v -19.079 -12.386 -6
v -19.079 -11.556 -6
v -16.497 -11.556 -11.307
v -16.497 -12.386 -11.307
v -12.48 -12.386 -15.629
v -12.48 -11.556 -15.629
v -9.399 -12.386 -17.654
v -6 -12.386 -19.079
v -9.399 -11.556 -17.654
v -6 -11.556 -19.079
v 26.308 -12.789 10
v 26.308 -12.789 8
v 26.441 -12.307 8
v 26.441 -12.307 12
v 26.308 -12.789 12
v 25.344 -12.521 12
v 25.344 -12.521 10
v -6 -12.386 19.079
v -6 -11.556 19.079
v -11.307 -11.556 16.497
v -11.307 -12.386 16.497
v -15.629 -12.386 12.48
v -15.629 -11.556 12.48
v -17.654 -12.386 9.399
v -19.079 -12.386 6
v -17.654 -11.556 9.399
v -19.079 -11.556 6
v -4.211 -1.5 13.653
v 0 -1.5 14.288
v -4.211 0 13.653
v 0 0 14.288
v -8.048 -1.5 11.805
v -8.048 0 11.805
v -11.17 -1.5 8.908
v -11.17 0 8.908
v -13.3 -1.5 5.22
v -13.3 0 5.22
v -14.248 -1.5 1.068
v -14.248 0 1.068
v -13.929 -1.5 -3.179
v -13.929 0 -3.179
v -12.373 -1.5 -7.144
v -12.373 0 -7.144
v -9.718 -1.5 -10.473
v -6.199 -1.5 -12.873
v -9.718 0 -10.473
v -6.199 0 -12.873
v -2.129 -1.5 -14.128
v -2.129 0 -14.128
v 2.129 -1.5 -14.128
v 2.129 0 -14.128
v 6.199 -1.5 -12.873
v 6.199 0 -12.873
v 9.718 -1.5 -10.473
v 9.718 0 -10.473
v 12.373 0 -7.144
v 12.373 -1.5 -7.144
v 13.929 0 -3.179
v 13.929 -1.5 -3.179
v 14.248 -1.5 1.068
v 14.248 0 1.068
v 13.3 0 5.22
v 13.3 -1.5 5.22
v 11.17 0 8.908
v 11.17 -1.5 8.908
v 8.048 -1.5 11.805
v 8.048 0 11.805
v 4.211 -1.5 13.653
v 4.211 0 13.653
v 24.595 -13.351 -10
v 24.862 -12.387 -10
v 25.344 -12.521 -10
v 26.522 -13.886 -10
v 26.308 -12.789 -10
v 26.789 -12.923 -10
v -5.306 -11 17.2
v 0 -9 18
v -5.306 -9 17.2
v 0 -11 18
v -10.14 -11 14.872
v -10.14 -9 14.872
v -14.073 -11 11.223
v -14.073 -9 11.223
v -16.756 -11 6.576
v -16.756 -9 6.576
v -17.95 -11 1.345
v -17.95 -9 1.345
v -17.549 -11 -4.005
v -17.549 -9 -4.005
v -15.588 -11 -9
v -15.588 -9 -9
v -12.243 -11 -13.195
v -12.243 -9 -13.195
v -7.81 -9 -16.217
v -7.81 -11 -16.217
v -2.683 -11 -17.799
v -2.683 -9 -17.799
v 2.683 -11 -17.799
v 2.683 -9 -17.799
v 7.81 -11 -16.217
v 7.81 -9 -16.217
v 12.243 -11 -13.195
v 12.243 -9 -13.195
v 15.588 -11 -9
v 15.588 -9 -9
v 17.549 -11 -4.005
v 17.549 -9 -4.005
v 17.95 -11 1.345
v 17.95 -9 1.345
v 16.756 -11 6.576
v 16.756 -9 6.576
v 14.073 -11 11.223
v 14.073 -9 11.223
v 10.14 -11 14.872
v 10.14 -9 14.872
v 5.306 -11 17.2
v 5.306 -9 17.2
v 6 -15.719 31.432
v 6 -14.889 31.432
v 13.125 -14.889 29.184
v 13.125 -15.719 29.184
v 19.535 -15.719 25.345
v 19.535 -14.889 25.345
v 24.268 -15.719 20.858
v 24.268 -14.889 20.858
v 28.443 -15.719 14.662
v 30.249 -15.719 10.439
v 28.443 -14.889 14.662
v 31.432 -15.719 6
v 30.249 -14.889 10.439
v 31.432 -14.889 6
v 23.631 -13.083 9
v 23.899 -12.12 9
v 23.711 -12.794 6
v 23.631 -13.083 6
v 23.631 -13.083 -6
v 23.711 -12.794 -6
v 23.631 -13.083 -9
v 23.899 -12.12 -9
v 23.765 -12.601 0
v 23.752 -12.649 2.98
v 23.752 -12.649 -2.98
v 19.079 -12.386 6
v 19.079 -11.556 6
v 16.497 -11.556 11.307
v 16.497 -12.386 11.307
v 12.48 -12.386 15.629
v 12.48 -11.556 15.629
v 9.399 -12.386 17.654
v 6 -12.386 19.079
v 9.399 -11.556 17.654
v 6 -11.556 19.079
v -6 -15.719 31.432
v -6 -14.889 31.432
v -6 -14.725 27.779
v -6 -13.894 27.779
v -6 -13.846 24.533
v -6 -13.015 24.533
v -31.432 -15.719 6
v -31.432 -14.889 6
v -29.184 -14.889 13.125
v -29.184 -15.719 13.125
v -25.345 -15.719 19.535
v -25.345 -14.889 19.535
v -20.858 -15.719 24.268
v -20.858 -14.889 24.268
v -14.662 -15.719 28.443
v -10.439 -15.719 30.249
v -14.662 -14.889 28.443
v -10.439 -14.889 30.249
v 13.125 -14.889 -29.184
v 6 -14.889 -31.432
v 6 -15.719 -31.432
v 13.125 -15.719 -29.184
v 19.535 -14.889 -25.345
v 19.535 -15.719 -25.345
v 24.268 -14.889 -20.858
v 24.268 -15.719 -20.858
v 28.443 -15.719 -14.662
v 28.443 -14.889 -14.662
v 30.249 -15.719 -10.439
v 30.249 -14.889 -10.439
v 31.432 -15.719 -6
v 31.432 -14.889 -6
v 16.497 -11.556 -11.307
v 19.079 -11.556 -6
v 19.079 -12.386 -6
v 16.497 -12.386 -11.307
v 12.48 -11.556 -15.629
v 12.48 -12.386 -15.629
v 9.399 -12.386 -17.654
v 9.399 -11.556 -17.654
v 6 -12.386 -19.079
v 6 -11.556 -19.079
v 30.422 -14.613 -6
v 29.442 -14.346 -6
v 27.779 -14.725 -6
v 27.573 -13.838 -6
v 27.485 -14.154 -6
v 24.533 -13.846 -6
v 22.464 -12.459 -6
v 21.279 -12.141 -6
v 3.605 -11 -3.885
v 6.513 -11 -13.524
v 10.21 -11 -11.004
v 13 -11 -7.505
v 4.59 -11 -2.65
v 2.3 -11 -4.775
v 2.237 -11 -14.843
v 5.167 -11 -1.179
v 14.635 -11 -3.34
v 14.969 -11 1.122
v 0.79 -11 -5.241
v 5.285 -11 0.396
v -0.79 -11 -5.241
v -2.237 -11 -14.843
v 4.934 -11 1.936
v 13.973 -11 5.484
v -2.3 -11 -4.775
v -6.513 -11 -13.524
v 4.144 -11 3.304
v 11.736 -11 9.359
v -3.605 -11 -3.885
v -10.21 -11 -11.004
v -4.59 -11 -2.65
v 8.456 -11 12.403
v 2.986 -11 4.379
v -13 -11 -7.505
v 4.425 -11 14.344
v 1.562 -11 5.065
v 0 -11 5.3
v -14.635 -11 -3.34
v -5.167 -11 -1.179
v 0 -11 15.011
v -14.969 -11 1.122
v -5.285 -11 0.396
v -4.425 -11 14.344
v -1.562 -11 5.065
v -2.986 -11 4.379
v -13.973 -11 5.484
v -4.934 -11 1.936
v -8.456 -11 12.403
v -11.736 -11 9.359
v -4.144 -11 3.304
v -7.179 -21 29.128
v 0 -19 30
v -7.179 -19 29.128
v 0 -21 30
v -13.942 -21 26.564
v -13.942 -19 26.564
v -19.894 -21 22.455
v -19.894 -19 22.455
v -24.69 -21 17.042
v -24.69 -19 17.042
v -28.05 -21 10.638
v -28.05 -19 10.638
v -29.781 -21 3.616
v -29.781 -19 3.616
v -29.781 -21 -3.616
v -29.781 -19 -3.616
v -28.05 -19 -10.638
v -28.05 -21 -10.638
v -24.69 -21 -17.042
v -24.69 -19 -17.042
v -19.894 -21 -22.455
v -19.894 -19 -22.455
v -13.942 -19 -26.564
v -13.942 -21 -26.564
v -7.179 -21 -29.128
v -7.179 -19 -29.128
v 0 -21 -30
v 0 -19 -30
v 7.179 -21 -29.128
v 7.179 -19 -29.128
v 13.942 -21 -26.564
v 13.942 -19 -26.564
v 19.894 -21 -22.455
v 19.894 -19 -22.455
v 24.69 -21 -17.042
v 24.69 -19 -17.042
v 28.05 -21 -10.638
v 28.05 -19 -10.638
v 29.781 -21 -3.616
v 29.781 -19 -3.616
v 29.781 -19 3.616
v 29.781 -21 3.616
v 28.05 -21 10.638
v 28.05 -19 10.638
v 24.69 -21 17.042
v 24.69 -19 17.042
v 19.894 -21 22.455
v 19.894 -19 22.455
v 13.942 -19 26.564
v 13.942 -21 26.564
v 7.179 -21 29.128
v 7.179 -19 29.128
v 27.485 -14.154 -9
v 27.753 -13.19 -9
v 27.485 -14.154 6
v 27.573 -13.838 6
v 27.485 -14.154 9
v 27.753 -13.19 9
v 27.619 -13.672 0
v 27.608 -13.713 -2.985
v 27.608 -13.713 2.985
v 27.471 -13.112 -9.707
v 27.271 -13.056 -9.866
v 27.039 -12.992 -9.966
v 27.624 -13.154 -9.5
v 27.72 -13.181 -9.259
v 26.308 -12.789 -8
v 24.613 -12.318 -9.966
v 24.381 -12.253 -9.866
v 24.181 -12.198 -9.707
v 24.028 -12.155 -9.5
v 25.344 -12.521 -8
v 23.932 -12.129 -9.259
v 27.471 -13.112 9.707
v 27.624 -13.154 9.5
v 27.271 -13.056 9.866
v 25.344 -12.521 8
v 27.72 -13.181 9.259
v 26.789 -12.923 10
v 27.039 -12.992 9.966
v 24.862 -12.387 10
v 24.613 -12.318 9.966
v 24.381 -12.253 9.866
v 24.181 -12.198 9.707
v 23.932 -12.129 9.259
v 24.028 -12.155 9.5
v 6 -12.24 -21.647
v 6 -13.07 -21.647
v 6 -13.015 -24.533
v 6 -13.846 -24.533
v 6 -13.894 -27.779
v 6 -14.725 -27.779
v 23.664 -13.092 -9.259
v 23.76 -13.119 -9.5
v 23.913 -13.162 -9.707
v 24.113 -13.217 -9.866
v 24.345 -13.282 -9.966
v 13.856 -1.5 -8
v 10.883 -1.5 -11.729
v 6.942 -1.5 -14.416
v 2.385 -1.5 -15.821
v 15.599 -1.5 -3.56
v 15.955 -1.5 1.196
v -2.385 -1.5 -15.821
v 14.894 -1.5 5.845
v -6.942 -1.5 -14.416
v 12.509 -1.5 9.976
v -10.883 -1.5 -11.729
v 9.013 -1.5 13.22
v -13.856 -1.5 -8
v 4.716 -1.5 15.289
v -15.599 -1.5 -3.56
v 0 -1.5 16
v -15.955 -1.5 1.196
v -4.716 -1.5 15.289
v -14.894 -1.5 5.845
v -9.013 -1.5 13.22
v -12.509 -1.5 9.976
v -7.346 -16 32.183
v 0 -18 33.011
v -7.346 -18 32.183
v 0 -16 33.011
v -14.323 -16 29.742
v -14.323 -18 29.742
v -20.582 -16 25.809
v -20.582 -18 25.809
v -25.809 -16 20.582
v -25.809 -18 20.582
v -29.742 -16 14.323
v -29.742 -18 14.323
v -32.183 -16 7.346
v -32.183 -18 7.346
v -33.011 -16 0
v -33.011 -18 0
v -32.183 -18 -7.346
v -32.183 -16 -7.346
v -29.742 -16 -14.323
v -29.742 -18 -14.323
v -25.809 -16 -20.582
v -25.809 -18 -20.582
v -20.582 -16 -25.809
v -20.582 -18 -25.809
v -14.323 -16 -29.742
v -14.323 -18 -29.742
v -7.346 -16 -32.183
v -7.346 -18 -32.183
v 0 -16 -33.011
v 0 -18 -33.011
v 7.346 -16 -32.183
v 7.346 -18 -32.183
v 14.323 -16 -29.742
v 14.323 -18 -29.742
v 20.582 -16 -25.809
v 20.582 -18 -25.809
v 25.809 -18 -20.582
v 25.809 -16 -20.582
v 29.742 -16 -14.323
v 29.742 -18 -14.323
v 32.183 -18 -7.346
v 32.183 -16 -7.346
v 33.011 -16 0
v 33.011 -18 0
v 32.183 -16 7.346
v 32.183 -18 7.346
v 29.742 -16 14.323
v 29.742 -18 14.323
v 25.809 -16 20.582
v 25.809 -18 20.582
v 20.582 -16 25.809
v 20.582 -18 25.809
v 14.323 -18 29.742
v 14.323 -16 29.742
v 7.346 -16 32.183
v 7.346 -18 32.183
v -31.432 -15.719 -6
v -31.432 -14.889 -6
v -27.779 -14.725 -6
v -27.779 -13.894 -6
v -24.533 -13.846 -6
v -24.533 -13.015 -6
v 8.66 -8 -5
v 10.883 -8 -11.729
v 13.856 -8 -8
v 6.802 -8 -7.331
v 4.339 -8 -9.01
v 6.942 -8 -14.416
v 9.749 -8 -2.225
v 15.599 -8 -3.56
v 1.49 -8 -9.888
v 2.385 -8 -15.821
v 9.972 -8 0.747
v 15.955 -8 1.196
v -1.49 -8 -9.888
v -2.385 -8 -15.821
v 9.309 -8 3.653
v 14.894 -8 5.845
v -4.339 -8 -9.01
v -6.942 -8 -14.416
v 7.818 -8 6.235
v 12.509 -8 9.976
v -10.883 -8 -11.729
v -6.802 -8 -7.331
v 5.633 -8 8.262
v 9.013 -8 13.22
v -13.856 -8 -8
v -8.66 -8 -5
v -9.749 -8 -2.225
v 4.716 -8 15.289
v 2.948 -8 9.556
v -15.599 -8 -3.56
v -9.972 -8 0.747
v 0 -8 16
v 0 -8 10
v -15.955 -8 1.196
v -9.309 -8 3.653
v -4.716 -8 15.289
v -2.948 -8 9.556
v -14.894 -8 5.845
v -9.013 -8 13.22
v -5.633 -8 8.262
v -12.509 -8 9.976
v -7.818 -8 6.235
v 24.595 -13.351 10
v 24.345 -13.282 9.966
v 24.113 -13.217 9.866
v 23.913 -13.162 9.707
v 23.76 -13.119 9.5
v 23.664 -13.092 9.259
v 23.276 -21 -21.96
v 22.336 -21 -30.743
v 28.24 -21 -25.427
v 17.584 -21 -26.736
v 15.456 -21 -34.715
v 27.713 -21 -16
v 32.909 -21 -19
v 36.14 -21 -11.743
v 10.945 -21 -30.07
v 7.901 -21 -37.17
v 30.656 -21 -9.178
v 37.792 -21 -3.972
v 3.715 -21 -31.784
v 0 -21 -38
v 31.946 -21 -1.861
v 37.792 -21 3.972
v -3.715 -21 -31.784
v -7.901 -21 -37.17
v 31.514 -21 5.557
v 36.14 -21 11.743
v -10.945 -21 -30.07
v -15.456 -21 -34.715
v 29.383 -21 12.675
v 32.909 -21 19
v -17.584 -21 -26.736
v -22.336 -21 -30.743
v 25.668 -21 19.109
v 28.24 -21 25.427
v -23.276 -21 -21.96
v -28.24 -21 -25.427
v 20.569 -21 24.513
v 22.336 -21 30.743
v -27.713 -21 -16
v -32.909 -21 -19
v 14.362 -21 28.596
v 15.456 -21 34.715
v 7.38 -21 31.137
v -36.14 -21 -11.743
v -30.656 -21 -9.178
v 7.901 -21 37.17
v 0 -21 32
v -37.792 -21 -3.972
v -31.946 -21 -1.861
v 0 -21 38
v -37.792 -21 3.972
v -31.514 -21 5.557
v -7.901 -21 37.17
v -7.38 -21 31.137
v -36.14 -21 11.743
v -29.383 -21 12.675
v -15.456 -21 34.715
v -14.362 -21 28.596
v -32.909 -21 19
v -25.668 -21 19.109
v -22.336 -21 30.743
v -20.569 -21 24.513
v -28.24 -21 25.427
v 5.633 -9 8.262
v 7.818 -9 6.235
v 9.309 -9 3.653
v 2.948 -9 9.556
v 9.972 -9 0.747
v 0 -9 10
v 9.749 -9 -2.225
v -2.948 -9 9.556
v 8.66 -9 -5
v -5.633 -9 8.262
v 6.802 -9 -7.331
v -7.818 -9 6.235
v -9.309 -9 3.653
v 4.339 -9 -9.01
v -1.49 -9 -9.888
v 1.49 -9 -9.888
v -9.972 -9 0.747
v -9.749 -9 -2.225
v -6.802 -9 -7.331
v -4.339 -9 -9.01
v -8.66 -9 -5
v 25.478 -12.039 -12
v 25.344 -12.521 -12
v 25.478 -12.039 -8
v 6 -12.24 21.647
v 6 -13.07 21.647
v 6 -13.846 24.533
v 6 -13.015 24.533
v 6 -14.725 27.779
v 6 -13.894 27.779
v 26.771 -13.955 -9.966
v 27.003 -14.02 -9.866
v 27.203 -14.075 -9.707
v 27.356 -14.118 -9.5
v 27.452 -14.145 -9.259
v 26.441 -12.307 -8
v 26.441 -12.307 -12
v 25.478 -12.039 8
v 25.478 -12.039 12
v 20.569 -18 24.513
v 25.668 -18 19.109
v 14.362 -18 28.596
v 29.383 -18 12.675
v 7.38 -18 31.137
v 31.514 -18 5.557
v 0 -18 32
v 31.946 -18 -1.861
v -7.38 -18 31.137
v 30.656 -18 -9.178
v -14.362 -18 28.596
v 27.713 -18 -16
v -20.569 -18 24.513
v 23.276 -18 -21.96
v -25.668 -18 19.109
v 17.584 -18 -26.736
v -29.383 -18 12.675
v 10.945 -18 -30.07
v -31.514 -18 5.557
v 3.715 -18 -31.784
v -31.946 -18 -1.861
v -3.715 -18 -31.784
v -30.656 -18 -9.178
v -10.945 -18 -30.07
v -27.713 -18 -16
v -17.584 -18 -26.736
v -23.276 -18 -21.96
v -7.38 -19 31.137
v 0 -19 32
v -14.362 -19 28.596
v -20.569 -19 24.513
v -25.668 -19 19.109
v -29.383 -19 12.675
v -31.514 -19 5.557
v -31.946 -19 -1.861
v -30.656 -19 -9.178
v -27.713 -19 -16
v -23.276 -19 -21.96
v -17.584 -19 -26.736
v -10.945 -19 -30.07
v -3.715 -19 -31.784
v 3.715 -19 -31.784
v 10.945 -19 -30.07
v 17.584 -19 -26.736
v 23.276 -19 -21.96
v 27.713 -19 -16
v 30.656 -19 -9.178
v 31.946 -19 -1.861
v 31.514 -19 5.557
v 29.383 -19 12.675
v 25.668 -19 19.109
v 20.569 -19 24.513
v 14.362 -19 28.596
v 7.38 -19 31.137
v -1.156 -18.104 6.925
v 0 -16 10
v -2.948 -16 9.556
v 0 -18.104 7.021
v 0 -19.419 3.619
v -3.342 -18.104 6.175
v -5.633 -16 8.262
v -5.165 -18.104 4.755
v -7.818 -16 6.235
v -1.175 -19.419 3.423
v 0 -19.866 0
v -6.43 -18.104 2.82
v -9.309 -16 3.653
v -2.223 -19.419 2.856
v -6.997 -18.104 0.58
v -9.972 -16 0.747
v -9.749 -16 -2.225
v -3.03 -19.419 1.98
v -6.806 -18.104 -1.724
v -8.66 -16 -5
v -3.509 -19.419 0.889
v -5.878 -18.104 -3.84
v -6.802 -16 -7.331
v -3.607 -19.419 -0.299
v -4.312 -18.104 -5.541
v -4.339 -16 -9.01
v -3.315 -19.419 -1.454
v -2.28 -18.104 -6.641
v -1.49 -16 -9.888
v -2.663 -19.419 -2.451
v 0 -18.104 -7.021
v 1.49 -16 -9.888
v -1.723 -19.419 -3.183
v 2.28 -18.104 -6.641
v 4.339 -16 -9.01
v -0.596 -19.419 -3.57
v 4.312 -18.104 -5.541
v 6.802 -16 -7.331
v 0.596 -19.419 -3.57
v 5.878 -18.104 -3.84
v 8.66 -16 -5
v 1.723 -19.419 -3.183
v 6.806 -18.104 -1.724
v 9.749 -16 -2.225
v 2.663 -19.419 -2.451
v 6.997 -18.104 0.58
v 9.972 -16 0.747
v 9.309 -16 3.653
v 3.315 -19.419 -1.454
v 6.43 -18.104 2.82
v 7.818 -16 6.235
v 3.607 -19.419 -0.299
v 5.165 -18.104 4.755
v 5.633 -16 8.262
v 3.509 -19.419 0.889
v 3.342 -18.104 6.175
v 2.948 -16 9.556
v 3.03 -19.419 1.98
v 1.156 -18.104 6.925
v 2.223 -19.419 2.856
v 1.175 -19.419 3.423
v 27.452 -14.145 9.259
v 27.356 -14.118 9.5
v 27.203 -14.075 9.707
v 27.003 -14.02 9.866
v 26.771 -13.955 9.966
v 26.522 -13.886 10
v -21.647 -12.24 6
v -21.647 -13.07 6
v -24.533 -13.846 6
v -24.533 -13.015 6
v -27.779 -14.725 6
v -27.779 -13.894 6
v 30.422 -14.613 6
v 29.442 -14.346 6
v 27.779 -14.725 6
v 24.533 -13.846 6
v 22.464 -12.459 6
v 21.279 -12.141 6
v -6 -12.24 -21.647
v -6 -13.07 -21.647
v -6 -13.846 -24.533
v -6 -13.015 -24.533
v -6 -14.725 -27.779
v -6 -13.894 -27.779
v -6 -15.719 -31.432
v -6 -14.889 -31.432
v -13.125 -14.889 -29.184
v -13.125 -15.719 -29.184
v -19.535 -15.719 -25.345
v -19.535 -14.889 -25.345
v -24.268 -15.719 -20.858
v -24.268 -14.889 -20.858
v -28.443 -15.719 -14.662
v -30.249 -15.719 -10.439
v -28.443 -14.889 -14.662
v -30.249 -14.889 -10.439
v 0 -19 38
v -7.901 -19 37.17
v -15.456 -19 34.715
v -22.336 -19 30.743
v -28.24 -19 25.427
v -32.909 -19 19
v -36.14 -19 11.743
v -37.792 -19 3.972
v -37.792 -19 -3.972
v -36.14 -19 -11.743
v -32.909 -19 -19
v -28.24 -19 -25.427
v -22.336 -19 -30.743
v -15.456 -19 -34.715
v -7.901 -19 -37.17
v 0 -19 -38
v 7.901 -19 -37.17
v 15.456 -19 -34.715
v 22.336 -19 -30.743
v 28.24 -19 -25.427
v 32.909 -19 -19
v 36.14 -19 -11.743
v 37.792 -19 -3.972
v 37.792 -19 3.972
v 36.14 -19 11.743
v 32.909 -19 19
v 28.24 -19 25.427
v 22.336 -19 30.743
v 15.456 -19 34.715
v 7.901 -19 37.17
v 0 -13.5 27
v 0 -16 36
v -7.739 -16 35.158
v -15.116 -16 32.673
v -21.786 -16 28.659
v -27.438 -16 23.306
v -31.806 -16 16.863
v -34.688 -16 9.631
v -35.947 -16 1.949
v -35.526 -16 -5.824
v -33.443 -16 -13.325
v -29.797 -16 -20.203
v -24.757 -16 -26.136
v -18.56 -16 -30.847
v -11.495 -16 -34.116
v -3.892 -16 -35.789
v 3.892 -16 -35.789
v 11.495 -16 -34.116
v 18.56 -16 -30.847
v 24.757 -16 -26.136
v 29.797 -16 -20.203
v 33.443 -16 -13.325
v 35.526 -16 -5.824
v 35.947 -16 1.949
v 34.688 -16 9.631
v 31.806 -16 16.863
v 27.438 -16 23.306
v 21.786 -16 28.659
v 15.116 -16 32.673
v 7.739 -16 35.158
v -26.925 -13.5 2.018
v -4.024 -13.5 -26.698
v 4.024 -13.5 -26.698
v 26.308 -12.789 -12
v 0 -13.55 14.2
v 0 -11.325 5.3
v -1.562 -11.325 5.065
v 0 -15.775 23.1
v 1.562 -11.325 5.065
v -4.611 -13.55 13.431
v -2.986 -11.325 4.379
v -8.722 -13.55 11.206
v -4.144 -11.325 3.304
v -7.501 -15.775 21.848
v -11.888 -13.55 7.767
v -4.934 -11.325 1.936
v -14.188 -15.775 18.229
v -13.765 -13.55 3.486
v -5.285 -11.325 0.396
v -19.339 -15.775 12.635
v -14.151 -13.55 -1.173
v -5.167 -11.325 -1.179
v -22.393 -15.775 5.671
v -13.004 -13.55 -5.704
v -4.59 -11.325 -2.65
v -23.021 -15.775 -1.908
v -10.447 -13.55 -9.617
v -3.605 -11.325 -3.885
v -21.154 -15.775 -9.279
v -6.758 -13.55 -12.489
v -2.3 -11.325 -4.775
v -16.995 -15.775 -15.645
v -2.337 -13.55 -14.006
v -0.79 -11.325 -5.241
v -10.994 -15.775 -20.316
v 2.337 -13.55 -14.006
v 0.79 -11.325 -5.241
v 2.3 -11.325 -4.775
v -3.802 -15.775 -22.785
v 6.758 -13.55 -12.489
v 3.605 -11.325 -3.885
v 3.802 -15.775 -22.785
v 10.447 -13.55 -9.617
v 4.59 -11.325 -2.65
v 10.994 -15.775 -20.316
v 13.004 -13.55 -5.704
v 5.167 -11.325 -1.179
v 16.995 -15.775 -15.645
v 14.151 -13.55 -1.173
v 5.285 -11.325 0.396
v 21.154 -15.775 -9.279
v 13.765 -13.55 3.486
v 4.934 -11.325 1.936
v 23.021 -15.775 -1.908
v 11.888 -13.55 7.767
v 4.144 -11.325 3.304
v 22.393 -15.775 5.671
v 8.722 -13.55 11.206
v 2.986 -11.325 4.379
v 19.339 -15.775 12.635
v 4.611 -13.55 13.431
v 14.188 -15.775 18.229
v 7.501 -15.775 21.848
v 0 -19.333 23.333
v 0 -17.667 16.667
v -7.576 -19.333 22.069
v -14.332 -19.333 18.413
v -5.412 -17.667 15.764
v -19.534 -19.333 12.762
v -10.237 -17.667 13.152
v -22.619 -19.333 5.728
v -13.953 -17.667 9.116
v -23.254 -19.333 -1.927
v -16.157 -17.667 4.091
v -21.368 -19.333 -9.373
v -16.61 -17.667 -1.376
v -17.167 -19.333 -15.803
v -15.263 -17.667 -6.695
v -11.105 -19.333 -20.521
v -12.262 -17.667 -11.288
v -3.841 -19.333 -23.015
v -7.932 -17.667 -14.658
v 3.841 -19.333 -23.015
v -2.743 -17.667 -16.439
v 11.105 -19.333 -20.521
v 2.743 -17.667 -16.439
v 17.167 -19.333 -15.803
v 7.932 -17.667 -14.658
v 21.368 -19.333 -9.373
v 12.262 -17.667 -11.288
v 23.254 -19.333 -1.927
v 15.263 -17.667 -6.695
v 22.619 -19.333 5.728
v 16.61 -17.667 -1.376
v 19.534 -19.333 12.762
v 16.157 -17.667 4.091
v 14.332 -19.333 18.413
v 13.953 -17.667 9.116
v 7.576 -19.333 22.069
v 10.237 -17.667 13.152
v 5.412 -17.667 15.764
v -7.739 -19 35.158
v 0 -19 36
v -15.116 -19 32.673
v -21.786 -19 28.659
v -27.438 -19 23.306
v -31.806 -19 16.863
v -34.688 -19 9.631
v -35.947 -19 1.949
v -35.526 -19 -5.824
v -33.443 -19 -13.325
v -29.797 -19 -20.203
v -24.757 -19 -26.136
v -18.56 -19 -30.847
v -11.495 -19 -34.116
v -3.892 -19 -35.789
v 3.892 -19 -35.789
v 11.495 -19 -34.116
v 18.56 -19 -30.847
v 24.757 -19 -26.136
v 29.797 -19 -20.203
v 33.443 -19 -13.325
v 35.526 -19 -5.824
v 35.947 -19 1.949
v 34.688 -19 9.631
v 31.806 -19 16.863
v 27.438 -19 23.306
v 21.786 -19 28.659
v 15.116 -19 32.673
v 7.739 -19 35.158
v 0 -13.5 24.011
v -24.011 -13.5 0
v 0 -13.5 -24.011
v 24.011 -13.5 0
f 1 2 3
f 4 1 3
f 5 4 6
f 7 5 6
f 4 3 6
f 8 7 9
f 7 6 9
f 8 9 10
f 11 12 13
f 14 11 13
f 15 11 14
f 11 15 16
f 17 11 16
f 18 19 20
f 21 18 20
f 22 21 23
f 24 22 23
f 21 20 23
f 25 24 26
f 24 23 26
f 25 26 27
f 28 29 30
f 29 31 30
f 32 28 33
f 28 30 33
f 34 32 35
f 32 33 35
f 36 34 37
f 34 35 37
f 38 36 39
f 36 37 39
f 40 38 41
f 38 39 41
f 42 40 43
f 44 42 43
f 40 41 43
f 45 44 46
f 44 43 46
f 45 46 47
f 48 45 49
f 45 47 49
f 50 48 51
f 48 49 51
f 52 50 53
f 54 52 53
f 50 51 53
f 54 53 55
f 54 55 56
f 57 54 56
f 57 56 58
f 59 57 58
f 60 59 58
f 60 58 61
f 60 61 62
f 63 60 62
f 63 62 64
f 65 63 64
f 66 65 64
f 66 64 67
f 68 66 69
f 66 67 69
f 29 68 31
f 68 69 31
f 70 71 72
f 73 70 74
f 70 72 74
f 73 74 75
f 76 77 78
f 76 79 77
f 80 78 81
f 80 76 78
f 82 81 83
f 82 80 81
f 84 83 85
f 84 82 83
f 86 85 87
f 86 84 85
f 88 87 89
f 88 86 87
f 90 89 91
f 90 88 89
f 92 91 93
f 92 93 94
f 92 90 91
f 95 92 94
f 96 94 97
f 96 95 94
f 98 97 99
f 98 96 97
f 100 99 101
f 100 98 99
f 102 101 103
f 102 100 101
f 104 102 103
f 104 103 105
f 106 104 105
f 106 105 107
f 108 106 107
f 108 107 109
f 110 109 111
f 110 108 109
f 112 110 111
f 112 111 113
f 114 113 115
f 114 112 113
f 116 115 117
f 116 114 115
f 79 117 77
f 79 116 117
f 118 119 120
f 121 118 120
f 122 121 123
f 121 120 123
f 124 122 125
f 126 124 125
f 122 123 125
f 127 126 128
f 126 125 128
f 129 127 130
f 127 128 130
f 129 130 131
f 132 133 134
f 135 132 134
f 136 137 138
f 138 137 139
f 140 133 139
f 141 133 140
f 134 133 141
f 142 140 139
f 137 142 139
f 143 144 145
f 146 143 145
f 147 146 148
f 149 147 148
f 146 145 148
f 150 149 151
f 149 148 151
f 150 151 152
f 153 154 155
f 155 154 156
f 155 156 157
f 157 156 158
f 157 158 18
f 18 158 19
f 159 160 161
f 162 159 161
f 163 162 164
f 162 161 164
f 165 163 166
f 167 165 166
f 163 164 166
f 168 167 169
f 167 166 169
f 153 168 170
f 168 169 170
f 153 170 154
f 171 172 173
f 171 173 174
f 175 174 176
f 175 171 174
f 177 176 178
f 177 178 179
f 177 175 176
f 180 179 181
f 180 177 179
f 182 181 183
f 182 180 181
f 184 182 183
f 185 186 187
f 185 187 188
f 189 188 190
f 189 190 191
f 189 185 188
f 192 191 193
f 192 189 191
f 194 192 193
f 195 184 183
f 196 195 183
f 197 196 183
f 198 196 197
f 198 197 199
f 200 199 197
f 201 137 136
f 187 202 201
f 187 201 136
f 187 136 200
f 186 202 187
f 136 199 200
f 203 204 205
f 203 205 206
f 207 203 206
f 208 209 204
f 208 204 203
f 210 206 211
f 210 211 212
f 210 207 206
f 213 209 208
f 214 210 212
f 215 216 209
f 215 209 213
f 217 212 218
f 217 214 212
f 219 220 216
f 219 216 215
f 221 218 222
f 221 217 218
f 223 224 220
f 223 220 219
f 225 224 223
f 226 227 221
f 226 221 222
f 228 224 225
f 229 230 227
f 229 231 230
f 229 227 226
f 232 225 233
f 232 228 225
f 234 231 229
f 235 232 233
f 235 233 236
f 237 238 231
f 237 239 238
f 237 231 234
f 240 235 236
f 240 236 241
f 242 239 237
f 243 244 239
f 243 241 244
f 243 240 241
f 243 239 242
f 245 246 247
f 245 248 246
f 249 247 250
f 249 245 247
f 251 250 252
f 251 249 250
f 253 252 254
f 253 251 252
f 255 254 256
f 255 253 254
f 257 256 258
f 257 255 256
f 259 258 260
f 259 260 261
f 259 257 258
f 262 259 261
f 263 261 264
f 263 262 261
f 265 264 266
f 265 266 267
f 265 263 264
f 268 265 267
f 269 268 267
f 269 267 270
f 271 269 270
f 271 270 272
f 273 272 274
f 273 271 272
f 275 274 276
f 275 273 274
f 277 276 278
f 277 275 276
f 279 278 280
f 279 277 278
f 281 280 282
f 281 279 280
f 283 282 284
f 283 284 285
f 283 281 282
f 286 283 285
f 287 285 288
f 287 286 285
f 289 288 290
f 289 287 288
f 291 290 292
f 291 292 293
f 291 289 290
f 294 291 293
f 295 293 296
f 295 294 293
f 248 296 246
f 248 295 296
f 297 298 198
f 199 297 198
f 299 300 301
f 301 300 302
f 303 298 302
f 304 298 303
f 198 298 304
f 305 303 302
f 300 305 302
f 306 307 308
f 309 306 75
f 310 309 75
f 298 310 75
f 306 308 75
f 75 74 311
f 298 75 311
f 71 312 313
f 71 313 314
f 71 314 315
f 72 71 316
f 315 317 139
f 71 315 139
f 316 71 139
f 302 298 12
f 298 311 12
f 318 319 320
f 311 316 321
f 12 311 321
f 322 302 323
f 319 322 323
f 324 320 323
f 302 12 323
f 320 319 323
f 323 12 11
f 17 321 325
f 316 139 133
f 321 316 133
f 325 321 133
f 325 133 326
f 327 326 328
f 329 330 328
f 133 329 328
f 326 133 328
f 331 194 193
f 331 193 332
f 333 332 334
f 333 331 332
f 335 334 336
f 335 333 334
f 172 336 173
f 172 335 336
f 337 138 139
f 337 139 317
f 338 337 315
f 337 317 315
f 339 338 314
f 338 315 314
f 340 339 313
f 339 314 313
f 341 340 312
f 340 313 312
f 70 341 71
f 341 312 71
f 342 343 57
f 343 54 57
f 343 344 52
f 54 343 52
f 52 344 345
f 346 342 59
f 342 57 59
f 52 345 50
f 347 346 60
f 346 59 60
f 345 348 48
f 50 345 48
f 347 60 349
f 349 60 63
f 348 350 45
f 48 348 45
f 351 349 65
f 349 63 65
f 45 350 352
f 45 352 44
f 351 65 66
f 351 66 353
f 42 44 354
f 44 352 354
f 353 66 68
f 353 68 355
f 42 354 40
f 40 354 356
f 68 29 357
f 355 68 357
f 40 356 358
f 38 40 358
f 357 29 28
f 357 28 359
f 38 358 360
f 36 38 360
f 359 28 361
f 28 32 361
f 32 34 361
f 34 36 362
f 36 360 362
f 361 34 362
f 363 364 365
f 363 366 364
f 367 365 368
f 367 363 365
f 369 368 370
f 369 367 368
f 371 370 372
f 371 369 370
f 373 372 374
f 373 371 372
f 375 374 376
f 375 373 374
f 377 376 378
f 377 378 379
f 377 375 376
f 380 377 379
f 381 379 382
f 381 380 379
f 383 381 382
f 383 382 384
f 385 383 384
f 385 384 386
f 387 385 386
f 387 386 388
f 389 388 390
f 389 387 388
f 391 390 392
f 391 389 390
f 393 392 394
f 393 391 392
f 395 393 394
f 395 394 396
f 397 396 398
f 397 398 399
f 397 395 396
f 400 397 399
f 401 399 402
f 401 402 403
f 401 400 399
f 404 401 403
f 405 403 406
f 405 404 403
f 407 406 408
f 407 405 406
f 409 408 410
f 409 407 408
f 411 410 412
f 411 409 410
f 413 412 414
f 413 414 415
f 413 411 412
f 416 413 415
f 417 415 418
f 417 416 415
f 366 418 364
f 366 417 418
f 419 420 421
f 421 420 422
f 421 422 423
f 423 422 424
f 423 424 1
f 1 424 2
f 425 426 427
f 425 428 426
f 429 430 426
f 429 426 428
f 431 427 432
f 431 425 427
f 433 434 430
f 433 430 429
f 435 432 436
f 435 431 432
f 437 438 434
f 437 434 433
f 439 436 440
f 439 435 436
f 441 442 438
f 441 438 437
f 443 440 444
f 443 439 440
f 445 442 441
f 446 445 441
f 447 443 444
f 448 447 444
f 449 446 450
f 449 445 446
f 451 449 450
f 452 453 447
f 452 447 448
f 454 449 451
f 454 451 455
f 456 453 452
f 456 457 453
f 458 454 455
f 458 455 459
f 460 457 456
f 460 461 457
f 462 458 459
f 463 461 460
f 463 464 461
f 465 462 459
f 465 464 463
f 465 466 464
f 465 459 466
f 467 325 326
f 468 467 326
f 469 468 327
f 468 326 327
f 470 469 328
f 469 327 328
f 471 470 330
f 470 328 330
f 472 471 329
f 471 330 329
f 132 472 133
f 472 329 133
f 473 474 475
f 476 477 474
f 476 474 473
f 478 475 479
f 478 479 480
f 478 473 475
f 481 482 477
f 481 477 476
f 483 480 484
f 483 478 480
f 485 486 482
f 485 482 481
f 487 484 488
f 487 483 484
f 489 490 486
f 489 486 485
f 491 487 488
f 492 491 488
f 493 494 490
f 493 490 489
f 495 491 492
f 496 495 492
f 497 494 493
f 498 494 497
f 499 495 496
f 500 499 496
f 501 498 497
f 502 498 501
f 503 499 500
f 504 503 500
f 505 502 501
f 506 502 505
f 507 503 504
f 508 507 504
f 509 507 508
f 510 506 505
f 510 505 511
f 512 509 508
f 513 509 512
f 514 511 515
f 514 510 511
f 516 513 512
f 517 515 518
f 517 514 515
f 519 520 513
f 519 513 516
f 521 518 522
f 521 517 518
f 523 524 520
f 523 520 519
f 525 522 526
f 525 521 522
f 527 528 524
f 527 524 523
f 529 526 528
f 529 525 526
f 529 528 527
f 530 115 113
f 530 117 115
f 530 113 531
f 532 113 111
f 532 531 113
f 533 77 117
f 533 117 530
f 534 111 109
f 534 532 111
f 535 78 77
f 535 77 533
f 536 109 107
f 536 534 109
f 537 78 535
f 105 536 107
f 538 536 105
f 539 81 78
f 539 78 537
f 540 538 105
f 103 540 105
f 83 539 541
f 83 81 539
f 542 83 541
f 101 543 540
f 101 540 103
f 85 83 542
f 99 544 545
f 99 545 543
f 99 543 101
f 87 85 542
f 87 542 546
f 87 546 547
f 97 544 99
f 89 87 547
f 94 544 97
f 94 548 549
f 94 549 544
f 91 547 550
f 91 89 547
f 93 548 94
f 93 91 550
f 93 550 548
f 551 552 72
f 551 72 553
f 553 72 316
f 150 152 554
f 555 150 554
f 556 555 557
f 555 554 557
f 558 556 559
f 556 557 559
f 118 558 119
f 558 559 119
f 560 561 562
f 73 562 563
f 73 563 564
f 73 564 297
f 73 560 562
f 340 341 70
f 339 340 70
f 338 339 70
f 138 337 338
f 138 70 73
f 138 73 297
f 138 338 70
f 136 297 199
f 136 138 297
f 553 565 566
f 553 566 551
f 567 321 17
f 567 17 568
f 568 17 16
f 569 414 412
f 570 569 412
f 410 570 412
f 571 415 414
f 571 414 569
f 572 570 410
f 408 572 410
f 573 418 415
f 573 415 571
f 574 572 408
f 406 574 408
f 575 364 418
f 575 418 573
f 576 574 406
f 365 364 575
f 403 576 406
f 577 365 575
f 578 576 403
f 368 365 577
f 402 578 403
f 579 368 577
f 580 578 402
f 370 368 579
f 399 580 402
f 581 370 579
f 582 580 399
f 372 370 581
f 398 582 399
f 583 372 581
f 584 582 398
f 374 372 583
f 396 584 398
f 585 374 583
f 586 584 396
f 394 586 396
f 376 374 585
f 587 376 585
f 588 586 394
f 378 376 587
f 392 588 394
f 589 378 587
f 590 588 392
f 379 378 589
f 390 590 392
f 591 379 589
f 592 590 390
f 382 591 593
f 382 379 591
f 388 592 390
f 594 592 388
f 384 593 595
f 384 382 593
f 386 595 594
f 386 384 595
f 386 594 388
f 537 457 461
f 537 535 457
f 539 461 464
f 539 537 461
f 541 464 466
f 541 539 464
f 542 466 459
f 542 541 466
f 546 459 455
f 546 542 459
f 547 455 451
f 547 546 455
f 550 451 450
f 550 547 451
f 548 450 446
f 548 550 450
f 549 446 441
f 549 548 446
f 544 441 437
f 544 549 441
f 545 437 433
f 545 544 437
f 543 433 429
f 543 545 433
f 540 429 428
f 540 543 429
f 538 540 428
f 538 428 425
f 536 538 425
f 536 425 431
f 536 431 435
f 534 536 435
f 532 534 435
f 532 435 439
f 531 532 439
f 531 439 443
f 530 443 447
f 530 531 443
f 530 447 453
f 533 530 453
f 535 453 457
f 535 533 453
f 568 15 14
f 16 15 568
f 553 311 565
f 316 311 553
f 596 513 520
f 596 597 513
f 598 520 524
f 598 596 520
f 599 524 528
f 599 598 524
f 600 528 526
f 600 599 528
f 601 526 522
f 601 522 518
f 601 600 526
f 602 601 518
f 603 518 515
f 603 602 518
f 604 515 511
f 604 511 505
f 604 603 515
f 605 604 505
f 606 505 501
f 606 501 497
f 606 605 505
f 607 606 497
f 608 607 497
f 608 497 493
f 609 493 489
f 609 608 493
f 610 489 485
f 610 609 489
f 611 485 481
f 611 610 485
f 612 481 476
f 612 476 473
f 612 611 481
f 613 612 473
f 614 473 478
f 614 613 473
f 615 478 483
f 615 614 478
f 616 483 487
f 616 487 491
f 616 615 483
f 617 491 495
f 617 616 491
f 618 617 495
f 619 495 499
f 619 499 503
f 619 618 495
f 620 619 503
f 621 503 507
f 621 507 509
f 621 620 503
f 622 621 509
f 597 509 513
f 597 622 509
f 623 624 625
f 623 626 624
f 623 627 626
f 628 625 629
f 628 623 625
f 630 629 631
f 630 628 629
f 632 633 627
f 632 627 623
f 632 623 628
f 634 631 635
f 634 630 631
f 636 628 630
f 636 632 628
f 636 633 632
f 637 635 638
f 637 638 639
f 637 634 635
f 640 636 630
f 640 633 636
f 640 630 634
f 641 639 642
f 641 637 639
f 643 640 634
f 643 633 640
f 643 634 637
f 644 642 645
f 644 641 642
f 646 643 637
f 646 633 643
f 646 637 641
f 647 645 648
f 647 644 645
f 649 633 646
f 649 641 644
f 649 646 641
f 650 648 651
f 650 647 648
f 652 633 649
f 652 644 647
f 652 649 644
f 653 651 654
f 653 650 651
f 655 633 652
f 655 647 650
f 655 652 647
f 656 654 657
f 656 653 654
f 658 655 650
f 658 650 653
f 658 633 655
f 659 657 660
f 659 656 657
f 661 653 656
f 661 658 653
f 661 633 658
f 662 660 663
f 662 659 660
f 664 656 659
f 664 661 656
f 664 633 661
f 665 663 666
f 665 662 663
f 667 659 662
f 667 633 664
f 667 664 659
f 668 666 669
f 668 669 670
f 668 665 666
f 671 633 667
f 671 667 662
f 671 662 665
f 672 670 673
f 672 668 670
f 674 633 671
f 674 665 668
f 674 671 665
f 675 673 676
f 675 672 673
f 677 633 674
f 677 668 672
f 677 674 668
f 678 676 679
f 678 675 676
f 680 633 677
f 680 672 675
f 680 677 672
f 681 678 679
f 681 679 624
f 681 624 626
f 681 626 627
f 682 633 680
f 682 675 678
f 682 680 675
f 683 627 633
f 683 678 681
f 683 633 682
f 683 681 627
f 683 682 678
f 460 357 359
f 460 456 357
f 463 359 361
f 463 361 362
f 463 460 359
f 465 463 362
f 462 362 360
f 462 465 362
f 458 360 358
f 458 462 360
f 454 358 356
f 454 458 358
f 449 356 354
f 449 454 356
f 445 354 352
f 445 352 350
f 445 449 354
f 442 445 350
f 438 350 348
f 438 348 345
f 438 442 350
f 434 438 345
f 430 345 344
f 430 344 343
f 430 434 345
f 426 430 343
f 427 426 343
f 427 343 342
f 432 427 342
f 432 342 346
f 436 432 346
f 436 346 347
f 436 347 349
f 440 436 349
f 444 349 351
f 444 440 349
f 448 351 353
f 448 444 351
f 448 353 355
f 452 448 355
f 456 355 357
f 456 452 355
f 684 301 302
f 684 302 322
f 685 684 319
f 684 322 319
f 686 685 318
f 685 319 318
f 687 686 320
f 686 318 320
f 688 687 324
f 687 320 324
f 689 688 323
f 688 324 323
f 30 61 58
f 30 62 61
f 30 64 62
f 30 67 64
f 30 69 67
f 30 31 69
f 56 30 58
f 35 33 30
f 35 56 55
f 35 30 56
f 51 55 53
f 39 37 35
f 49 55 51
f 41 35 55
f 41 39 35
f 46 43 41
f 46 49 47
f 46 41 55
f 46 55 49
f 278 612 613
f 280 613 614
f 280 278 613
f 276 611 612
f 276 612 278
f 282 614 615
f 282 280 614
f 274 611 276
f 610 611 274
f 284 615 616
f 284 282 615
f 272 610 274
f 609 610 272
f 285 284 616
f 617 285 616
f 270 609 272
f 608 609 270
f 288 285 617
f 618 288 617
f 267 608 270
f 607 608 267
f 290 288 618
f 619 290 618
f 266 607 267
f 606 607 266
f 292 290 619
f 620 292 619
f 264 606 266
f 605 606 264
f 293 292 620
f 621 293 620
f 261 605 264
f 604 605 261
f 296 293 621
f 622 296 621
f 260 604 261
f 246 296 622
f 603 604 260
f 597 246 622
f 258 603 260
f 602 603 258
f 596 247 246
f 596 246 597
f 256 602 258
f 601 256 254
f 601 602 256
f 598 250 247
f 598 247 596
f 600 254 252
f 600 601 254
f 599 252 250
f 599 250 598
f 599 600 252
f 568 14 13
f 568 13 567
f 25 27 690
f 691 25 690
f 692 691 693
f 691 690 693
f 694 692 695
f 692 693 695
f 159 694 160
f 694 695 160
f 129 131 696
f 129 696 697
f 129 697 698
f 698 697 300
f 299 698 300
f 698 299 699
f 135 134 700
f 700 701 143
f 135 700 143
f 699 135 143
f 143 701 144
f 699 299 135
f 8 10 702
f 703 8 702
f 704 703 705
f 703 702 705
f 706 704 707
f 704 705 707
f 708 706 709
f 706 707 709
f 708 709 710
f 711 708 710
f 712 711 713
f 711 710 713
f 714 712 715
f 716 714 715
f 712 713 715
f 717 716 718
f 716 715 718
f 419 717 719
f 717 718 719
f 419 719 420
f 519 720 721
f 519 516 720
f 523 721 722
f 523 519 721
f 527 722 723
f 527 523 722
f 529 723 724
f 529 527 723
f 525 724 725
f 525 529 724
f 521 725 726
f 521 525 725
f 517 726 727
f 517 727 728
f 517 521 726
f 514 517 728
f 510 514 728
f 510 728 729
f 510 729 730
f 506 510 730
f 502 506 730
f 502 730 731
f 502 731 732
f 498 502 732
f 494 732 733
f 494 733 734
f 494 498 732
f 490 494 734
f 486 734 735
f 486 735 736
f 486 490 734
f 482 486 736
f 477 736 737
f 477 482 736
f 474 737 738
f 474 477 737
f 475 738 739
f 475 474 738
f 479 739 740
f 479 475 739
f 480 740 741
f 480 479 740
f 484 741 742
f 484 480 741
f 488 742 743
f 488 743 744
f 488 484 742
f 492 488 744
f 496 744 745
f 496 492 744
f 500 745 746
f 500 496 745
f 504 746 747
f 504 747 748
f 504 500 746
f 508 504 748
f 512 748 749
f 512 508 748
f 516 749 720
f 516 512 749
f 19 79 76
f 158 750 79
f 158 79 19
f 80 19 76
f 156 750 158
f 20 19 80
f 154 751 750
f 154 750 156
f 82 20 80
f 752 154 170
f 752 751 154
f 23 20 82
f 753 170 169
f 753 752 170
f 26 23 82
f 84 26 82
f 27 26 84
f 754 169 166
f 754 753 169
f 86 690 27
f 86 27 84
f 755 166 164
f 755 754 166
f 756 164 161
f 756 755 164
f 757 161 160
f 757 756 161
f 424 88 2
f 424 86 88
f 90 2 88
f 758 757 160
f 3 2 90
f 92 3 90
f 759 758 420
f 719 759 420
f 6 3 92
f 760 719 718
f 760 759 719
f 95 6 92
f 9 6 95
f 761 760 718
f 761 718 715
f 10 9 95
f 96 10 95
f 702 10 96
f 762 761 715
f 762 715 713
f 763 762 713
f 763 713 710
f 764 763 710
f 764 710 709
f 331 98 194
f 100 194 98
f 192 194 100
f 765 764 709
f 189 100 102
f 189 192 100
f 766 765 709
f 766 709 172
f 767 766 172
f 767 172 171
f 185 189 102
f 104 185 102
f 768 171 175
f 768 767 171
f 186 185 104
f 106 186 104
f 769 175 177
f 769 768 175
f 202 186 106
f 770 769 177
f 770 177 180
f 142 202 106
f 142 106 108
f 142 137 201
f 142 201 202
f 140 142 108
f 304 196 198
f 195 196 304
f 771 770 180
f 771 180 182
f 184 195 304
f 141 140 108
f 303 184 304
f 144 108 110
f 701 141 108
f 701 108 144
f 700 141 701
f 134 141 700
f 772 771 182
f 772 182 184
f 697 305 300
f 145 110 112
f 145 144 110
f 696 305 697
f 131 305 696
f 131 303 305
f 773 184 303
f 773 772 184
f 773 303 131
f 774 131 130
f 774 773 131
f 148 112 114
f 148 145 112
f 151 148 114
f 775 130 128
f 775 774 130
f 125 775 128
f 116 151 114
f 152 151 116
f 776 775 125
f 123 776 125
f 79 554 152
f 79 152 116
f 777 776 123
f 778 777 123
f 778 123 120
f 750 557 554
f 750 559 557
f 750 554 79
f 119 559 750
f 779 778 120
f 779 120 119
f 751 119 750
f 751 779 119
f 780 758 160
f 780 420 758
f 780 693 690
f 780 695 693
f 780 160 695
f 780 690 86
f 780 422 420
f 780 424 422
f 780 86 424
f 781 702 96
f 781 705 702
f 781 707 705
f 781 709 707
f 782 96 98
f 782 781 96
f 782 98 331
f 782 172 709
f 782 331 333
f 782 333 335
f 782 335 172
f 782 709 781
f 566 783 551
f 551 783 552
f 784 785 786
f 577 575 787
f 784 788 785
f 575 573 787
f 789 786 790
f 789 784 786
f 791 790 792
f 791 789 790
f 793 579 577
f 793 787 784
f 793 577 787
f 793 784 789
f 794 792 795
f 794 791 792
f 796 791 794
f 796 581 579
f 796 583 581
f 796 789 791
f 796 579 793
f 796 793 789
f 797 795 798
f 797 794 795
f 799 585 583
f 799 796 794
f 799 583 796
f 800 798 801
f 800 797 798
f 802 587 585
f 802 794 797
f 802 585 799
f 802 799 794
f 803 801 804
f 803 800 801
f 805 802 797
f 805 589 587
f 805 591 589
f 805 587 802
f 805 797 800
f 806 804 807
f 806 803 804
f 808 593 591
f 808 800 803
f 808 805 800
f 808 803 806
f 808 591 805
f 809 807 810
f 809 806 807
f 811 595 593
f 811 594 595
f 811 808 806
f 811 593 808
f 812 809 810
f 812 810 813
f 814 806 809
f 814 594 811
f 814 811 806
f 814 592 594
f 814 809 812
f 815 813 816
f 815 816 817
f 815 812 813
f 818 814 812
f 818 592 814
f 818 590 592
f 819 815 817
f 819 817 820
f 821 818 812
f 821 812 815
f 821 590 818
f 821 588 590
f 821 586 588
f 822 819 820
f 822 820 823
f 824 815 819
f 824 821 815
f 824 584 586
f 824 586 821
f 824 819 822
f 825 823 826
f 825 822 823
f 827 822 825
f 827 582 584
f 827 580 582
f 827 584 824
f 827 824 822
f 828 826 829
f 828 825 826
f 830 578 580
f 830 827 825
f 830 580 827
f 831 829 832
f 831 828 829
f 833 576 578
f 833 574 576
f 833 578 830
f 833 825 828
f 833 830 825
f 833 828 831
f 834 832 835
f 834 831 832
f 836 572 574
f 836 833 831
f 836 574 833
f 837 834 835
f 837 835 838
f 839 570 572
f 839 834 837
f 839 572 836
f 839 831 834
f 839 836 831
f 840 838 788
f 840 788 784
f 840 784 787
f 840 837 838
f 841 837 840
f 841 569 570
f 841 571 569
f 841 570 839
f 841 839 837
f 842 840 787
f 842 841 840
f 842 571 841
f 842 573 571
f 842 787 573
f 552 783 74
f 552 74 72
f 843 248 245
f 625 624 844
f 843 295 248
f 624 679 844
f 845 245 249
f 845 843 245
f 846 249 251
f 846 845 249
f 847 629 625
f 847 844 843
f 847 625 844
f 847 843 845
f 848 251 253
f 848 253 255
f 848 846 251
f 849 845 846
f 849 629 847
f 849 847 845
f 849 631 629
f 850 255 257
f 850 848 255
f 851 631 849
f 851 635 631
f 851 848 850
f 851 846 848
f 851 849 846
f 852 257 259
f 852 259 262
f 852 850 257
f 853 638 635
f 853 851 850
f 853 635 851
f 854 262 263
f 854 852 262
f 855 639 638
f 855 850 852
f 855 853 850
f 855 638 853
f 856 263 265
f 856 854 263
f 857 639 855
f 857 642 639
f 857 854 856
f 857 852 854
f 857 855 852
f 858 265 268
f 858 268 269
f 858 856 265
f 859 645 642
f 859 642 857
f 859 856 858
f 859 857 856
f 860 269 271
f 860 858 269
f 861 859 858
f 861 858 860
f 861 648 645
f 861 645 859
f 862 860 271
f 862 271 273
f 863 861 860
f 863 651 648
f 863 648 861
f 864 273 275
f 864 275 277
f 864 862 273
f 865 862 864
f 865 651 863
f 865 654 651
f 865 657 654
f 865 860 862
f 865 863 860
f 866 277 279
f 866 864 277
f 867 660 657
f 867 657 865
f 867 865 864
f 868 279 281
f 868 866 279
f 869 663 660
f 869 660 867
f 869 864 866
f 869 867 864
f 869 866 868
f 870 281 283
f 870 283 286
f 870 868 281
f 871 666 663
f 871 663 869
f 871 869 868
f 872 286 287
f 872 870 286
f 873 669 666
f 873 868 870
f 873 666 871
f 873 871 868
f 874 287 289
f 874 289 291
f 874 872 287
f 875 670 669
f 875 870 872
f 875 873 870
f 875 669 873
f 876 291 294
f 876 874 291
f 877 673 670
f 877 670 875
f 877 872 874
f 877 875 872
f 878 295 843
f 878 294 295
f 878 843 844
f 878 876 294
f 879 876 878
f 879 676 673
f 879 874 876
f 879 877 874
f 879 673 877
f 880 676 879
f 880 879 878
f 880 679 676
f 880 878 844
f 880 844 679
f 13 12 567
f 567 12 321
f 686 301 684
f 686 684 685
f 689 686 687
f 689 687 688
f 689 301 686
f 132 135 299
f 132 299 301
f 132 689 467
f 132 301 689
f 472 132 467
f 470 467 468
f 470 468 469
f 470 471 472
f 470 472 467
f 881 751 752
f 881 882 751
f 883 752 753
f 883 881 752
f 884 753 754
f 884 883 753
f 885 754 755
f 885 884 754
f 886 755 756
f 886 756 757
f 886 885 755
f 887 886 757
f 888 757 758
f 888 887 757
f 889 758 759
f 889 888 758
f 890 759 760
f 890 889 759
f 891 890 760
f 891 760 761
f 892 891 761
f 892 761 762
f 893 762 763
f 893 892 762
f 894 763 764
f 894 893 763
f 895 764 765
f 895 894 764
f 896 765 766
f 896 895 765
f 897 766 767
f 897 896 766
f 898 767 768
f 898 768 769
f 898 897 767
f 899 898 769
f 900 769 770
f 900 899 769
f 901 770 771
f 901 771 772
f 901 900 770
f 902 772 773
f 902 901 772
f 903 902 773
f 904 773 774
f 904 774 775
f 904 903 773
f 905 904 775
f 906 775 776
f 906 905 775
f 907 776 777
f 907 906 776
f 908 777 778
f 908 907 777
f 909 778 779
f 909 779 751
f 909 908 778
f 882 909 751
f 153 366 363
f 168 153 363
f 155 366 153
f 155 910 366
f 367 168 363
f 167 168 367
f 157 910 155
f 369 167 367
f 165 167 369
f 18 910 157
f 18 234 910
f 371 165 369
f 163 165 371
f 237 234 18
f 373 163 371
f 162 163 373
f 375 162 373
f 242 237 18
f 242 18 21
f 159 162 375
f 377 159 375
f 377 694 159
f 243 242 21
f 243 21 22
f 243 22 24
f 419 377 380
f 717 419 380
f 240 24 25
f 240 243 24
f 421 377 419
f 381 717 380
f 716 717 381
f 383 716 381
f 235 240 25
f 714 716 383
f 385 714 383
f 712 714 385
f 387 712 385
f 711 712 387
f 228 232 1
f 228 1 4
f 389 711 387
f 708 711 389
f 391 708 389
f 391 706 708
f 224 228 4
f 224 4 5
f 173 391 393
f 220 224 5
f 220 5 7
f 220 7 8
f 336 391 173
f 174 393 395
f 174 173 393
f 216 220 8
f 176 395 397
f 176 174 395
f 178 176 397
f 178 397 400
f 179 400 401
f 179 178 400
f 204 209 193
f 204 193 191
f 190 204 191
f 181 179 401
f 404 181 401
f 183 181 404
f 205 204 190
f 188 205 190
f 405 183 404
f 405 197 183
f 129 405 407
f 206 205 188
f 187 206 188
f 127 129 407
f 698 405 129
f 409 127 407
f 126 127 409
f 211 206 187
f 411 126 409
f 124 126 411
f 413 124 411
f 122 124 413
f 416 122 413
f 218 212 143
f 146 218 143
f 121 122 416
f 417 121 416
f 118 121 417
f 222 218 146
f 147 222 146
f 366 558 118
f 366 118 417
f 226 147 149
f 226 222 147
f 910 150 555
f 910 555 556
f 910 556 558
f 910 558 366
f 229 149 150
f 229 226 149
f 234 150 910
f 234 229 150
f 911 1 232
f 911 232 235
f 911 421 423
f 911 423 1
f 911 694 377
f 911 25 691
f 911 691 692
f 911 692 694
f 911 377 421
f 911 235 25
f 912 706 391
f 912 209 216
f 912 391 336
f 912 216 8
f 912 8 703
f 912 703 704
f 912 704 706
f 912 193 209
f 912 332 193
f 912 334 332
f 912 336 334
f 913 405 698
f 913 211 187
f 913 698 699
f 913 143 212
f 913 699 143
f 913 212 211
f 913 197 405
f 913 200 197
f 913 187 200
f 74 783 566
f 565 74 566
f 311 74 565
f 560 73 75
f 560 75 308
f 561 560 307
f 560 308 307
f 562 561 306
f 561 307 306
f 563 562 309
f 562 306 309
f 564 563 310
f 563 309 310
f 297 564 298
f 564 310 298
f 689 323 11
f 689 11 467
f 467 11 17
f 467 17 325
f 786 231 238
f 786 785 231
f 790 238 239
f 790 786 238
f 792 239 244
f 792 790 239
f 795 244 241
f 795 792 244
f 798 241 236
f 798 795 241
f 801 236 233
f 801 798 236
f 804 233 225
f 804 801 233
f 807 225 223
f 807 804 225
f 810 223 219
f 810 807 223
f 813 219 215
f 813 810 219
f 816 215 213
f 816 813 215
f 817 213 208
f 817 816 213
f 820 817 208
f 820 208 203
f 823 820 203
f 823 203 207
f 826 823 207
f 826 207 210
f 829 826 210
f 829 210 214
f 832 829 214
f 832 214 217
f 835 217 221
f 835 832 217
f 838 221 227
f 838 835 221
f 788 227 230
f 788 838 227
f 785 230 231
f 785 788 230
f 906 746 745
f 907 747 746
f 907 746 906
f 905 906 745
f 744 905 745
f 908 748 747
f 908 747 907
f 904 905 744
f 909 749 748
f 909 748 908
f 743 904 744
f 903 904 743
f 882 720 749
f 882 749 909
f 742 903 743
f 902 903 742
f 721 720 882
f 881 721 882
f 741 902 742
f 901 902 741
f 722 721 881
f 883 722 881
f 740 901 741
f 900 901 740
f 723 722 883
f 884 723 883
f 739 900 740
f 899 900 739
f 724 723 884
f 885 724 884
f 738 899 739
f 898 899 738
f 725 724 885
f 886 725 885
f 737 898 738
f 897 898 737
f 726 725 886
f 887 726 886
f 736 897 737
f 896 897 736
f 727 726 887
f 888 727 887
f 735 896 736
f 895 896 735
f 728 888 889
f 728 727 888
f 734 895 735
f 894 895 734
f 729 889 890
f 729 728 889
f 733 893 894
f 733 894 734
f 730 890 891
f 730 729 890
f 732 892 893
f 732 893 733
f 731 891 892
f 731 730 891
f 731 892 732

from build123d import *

# Parameters (mm, degrees)
ESQUISSE2_W             = 1.7125
ESQUISSE2_H             = 1.5
ENL_V_MAT_EXTRU_2_REACH = 59.697
BOSS_EXTRU_2_DEPTH      = 0.5
ESQUISSE5_W             = 1
ESQUISSE5_H             = 4
BOSS_EXTRU_3_DEPTH      = 0.5


with BuildPart() as part:
    # Esquisse1 → Base-Révolution (revolve)
    with BuildSketch(Plane.XY, mode=Mode.PRIVATE) as base_r_volution_sk:
        with BuildLine():
            Line((0, 0), (-16, 0))
            Line((-16, 0), (-16, -8))
            Line((-16, -8), (-10, -8))
            Line((-10, -8), (-10, -9))
            Line((-10, -9), (-18, -9))
            Line((-18, -9), (-18, -11))
            Line((-18, -11), (-36, -16))
            Line((-36, -16), (-36, -19))
            Line((-36, -19), (-38, -19))
            Line((-38, -19), (-38, -21))
            Line((-38, -21), (-32, -21))
            Line((-32, -21), (-32, -19))
            Line((-32, -19), (-30, -19))
            Line((-30, -19), (-30, -21))
            Line((-30, -21), (-10, -16))
            ThreePointArc((-10, -16), (-5.360654987, -18.865907042), (0, -19.866068747))
            Line((0, -19.866068747), (0, 0))
        make_face()
    revolve(base_r_volution_sk.sketch.rotate(Axis((0, 70, 0), (0, -1, 0)), 270), axis=Axis((0, 70, 0), (0, -1, 0)))

    # Esquisse2 → Enlèvement de matière-Révolution1 (revolve, cut)
    with BuildSketch(Plane.XY, mode=Mode.PRIVATE) as enl_vement_de_mati_re_r_volution1_sk:
        Polygon((-33.010953329, -16), (-15.010953329, -11), (-5.3, -11), (-5.3, -11.325), (-32, -18), (-33.010953329, -18), align=None)
        with Locations((-15.14375, -0.75)):
            Rectangle(ESQUISSE2_W, ESQUISSE2_H)
    revolve(enl_vement_de_mati_re_r_volution1_sk.sketch.rotate(Axis((0, 0, 0), (0, -1, 0)), 270), axis=Axis((0, 0, 0), (0, -1, 0)), mode=Mode.SUBTRACT)

    # Esquisse3 → Enlèv. mat.-Extru.2 (cut, up to next)
    with BuildSketch(Plane(origin=(0, 0, 0), x_dir=(1, 0, 0), z_dir=(0, 1, 0)), mode=Mode.PRIVATE) as enl_v_mat_extru_2_sk1:
        with BuildLine():
            Line((6, 19.078784028), (6, 31.432467291))
            ThreePointArc((6, 31.432467291), (22.627416998, 22.627416998), (31.432467291, 6))
            Line((31.432467291, 6), (19.078784028, 6))
            ThreePointArc((19.078784028, 6), (14.142135624, 14.142135624), (6, 19.078784028))
        make_face()
    enl_v_mat_extru_2_tool1 = extrude(enl_v_mat_extru_2_sk1.sketch, amount=-ENL_V_MAT_EXTRU_2_REACH, mode=Mode.PRIVATE) & part.part
    # Esquisse3 → Enlèv. mat.-Extru.2 (cut, up to next)
    with BuildSketch(Plane(origin=(0, 0, 0), x_dir=(1, 0, 0), z_dir=(0, 1, 0)), mode=Mode.PRIVATE) as enl_v_mat_extru_2_sk2:
        with BuildLine():
            Line((-6, 19.078784028), (-6, 31.432467291))
            ThreePointArc((-6, 31.432467291), (-22.627416998, 22.627416998), (-31.432467291, 6))
            Line((-31.432467291, 6), (-19.078784028, 6))
            ThreePointArc((-19.078784028, 6), (-14.142135624, 14.142135624), (-6, 19.078784028))
        make_face()
    enl_v_mat_extru_2_tool2 = extrude(enl_v_mat_extru_2_sk2.sketch, amount=-ENL_V_MAT_EXTRU_2_REACH, mode=Mode.PRIVATE) & part.part
    # Esquisse3 → Enlèv. mat.-Extru.2 (cut, up to next)
    with BuildSketch(Plane(origin=(0, 0, 0), x_dir=(1, 0, 0), z_dir=(0, 1, 0)), mode=Mode.PRIVATE) as enl_v_mat_extru_2_sk3:
        with BuildLine():
            Line((-19.078784028, -6), (-31.432467291, -6))
            ThreePointArc((-31.432467291, -6), (-22.627416998, -22.627416998), (-6, -31.432467291))
            Line((-6, -31.432467291), (-6, -19.078784028))
            ThreePointArc((-6, -19.078784028), (-14.142135624, -14.142135624), (-19.078784028, -6))
        make_face()
    enl_v_mat_extru_2_tool3 = extrude(enl_v_mat_extru_2_sk3.sketch, amount=-ENL_V_MAT_EXTRU_2_REACH, mode=Mode.PRIVATE) & part.part
    # Esquisse3 → Enlèv. mat.-Extru.2 (cut, up to next)
    with BuildSketch(Plane(origin=(0, 0, 0), x_dir=(1, 0, 0), z_dir=(0, 1, 0)), mode=Mode.PRIVATE) as enl_v_mat_extru_2_sk4:
        with BuildLine():
            Line((6, -19.078784028), (6, -31.432467291))
            ThreePointArc((6, -31.432467291), (22.627416998, -22.627416998), (31.432467291, -6))
            Line((31.432467291, -6), (19.078784028, -6))
            ThreePointArc((19.078784028, -6), (14.142135624, -14.142135624), (6, -19.078784028))
        make_face()
    enl_v_mat_extru_2_tool4 = extrude(enl_v_mat_extru_2_sk4.sketch, amount=-ENL_V_MAT_EXTRU_2_REACH, mode=Mode.PRIVATE) & part.part
    add(enl_v_mat_extru_2_tool1.solids().sort_by_distance((17.884719, 0, -17.884719))[0], mode=Mode.SUBTRACT)
    add(enl_v_mat_extru_2_tool2.solids().sort_by_distance((-17.884719, 0, -17.884719))[0], mode=Mode.SUBTRACT)
    add(enl_v_mat_extru_2_tool3.solids().sort_by_distance((-17.884719, 0, 17.884719))[0], mode=Mode.SUBTRACT)
    add(enl_v_mat_extru_2_tool4.solids().sort_by_distance((17.884719, 0, 17.884719))[0], mode=Mode.SUBTRACT)

    # Esquisse4 → Boss.-Extru.2 (add, symmetric)
    with BuildSketch(Plane(origin=(27, -13.5, 0), x_dir=(0, 0, -1), z_dir=(0.26764386378609417, 0.9635179096299408, 0))):
        with BuildLine():
            Line((-9, 3.357510793), (9, 3.357510793))
            ThreePointArc((9, 3.357510793), (9.707106781, 3.064617574), (10, 2.357510793))
            Line((10, 2.357510793), (10, 0.357510793))
            ThreePointArc((10, 0.357510793), (9.707106781, -0.349595989), (9, -0.642489207))
            Line((9, -0.642489207), (-9, -0.642489207))
            ThreePointArc((-9, -0.642489207), (-9.707106781, -0.349595989), (-10, 0.357510793))
            Line((-10, 0.357510793), (-10, 2.357510793))
            ThreePointArc((-10, 2.357510793), (-9.707106781, 3.064617574), (-9, 3.357510793))
        make_face()
    extrude(amount=BOSS_EXTRU_2_DEPTH, both=True)

    # Esquisse5 → Boss.-Extru.3 (add)
    with BuildSketch(Plane(origin=(-1.413456005, -5.088441618, 0), x_dir=(-0.9635179096299408, 0.26764386378609417, 0), z_dir=(0.26764386378609417, 0.9635179096299408, 0))):
        with Locations((-28.270664928, 10)):
            Rectangle(ESQUISSE5_W, ESQUISSE5_H)
        with Locations((-28.270664928, -10)):
            Rectangle(ESQUISSE5_W, ESQUISSE5_H)
    extrude(amount=BOSS_EXTRU_3_DEPTH)


solid = part.part
